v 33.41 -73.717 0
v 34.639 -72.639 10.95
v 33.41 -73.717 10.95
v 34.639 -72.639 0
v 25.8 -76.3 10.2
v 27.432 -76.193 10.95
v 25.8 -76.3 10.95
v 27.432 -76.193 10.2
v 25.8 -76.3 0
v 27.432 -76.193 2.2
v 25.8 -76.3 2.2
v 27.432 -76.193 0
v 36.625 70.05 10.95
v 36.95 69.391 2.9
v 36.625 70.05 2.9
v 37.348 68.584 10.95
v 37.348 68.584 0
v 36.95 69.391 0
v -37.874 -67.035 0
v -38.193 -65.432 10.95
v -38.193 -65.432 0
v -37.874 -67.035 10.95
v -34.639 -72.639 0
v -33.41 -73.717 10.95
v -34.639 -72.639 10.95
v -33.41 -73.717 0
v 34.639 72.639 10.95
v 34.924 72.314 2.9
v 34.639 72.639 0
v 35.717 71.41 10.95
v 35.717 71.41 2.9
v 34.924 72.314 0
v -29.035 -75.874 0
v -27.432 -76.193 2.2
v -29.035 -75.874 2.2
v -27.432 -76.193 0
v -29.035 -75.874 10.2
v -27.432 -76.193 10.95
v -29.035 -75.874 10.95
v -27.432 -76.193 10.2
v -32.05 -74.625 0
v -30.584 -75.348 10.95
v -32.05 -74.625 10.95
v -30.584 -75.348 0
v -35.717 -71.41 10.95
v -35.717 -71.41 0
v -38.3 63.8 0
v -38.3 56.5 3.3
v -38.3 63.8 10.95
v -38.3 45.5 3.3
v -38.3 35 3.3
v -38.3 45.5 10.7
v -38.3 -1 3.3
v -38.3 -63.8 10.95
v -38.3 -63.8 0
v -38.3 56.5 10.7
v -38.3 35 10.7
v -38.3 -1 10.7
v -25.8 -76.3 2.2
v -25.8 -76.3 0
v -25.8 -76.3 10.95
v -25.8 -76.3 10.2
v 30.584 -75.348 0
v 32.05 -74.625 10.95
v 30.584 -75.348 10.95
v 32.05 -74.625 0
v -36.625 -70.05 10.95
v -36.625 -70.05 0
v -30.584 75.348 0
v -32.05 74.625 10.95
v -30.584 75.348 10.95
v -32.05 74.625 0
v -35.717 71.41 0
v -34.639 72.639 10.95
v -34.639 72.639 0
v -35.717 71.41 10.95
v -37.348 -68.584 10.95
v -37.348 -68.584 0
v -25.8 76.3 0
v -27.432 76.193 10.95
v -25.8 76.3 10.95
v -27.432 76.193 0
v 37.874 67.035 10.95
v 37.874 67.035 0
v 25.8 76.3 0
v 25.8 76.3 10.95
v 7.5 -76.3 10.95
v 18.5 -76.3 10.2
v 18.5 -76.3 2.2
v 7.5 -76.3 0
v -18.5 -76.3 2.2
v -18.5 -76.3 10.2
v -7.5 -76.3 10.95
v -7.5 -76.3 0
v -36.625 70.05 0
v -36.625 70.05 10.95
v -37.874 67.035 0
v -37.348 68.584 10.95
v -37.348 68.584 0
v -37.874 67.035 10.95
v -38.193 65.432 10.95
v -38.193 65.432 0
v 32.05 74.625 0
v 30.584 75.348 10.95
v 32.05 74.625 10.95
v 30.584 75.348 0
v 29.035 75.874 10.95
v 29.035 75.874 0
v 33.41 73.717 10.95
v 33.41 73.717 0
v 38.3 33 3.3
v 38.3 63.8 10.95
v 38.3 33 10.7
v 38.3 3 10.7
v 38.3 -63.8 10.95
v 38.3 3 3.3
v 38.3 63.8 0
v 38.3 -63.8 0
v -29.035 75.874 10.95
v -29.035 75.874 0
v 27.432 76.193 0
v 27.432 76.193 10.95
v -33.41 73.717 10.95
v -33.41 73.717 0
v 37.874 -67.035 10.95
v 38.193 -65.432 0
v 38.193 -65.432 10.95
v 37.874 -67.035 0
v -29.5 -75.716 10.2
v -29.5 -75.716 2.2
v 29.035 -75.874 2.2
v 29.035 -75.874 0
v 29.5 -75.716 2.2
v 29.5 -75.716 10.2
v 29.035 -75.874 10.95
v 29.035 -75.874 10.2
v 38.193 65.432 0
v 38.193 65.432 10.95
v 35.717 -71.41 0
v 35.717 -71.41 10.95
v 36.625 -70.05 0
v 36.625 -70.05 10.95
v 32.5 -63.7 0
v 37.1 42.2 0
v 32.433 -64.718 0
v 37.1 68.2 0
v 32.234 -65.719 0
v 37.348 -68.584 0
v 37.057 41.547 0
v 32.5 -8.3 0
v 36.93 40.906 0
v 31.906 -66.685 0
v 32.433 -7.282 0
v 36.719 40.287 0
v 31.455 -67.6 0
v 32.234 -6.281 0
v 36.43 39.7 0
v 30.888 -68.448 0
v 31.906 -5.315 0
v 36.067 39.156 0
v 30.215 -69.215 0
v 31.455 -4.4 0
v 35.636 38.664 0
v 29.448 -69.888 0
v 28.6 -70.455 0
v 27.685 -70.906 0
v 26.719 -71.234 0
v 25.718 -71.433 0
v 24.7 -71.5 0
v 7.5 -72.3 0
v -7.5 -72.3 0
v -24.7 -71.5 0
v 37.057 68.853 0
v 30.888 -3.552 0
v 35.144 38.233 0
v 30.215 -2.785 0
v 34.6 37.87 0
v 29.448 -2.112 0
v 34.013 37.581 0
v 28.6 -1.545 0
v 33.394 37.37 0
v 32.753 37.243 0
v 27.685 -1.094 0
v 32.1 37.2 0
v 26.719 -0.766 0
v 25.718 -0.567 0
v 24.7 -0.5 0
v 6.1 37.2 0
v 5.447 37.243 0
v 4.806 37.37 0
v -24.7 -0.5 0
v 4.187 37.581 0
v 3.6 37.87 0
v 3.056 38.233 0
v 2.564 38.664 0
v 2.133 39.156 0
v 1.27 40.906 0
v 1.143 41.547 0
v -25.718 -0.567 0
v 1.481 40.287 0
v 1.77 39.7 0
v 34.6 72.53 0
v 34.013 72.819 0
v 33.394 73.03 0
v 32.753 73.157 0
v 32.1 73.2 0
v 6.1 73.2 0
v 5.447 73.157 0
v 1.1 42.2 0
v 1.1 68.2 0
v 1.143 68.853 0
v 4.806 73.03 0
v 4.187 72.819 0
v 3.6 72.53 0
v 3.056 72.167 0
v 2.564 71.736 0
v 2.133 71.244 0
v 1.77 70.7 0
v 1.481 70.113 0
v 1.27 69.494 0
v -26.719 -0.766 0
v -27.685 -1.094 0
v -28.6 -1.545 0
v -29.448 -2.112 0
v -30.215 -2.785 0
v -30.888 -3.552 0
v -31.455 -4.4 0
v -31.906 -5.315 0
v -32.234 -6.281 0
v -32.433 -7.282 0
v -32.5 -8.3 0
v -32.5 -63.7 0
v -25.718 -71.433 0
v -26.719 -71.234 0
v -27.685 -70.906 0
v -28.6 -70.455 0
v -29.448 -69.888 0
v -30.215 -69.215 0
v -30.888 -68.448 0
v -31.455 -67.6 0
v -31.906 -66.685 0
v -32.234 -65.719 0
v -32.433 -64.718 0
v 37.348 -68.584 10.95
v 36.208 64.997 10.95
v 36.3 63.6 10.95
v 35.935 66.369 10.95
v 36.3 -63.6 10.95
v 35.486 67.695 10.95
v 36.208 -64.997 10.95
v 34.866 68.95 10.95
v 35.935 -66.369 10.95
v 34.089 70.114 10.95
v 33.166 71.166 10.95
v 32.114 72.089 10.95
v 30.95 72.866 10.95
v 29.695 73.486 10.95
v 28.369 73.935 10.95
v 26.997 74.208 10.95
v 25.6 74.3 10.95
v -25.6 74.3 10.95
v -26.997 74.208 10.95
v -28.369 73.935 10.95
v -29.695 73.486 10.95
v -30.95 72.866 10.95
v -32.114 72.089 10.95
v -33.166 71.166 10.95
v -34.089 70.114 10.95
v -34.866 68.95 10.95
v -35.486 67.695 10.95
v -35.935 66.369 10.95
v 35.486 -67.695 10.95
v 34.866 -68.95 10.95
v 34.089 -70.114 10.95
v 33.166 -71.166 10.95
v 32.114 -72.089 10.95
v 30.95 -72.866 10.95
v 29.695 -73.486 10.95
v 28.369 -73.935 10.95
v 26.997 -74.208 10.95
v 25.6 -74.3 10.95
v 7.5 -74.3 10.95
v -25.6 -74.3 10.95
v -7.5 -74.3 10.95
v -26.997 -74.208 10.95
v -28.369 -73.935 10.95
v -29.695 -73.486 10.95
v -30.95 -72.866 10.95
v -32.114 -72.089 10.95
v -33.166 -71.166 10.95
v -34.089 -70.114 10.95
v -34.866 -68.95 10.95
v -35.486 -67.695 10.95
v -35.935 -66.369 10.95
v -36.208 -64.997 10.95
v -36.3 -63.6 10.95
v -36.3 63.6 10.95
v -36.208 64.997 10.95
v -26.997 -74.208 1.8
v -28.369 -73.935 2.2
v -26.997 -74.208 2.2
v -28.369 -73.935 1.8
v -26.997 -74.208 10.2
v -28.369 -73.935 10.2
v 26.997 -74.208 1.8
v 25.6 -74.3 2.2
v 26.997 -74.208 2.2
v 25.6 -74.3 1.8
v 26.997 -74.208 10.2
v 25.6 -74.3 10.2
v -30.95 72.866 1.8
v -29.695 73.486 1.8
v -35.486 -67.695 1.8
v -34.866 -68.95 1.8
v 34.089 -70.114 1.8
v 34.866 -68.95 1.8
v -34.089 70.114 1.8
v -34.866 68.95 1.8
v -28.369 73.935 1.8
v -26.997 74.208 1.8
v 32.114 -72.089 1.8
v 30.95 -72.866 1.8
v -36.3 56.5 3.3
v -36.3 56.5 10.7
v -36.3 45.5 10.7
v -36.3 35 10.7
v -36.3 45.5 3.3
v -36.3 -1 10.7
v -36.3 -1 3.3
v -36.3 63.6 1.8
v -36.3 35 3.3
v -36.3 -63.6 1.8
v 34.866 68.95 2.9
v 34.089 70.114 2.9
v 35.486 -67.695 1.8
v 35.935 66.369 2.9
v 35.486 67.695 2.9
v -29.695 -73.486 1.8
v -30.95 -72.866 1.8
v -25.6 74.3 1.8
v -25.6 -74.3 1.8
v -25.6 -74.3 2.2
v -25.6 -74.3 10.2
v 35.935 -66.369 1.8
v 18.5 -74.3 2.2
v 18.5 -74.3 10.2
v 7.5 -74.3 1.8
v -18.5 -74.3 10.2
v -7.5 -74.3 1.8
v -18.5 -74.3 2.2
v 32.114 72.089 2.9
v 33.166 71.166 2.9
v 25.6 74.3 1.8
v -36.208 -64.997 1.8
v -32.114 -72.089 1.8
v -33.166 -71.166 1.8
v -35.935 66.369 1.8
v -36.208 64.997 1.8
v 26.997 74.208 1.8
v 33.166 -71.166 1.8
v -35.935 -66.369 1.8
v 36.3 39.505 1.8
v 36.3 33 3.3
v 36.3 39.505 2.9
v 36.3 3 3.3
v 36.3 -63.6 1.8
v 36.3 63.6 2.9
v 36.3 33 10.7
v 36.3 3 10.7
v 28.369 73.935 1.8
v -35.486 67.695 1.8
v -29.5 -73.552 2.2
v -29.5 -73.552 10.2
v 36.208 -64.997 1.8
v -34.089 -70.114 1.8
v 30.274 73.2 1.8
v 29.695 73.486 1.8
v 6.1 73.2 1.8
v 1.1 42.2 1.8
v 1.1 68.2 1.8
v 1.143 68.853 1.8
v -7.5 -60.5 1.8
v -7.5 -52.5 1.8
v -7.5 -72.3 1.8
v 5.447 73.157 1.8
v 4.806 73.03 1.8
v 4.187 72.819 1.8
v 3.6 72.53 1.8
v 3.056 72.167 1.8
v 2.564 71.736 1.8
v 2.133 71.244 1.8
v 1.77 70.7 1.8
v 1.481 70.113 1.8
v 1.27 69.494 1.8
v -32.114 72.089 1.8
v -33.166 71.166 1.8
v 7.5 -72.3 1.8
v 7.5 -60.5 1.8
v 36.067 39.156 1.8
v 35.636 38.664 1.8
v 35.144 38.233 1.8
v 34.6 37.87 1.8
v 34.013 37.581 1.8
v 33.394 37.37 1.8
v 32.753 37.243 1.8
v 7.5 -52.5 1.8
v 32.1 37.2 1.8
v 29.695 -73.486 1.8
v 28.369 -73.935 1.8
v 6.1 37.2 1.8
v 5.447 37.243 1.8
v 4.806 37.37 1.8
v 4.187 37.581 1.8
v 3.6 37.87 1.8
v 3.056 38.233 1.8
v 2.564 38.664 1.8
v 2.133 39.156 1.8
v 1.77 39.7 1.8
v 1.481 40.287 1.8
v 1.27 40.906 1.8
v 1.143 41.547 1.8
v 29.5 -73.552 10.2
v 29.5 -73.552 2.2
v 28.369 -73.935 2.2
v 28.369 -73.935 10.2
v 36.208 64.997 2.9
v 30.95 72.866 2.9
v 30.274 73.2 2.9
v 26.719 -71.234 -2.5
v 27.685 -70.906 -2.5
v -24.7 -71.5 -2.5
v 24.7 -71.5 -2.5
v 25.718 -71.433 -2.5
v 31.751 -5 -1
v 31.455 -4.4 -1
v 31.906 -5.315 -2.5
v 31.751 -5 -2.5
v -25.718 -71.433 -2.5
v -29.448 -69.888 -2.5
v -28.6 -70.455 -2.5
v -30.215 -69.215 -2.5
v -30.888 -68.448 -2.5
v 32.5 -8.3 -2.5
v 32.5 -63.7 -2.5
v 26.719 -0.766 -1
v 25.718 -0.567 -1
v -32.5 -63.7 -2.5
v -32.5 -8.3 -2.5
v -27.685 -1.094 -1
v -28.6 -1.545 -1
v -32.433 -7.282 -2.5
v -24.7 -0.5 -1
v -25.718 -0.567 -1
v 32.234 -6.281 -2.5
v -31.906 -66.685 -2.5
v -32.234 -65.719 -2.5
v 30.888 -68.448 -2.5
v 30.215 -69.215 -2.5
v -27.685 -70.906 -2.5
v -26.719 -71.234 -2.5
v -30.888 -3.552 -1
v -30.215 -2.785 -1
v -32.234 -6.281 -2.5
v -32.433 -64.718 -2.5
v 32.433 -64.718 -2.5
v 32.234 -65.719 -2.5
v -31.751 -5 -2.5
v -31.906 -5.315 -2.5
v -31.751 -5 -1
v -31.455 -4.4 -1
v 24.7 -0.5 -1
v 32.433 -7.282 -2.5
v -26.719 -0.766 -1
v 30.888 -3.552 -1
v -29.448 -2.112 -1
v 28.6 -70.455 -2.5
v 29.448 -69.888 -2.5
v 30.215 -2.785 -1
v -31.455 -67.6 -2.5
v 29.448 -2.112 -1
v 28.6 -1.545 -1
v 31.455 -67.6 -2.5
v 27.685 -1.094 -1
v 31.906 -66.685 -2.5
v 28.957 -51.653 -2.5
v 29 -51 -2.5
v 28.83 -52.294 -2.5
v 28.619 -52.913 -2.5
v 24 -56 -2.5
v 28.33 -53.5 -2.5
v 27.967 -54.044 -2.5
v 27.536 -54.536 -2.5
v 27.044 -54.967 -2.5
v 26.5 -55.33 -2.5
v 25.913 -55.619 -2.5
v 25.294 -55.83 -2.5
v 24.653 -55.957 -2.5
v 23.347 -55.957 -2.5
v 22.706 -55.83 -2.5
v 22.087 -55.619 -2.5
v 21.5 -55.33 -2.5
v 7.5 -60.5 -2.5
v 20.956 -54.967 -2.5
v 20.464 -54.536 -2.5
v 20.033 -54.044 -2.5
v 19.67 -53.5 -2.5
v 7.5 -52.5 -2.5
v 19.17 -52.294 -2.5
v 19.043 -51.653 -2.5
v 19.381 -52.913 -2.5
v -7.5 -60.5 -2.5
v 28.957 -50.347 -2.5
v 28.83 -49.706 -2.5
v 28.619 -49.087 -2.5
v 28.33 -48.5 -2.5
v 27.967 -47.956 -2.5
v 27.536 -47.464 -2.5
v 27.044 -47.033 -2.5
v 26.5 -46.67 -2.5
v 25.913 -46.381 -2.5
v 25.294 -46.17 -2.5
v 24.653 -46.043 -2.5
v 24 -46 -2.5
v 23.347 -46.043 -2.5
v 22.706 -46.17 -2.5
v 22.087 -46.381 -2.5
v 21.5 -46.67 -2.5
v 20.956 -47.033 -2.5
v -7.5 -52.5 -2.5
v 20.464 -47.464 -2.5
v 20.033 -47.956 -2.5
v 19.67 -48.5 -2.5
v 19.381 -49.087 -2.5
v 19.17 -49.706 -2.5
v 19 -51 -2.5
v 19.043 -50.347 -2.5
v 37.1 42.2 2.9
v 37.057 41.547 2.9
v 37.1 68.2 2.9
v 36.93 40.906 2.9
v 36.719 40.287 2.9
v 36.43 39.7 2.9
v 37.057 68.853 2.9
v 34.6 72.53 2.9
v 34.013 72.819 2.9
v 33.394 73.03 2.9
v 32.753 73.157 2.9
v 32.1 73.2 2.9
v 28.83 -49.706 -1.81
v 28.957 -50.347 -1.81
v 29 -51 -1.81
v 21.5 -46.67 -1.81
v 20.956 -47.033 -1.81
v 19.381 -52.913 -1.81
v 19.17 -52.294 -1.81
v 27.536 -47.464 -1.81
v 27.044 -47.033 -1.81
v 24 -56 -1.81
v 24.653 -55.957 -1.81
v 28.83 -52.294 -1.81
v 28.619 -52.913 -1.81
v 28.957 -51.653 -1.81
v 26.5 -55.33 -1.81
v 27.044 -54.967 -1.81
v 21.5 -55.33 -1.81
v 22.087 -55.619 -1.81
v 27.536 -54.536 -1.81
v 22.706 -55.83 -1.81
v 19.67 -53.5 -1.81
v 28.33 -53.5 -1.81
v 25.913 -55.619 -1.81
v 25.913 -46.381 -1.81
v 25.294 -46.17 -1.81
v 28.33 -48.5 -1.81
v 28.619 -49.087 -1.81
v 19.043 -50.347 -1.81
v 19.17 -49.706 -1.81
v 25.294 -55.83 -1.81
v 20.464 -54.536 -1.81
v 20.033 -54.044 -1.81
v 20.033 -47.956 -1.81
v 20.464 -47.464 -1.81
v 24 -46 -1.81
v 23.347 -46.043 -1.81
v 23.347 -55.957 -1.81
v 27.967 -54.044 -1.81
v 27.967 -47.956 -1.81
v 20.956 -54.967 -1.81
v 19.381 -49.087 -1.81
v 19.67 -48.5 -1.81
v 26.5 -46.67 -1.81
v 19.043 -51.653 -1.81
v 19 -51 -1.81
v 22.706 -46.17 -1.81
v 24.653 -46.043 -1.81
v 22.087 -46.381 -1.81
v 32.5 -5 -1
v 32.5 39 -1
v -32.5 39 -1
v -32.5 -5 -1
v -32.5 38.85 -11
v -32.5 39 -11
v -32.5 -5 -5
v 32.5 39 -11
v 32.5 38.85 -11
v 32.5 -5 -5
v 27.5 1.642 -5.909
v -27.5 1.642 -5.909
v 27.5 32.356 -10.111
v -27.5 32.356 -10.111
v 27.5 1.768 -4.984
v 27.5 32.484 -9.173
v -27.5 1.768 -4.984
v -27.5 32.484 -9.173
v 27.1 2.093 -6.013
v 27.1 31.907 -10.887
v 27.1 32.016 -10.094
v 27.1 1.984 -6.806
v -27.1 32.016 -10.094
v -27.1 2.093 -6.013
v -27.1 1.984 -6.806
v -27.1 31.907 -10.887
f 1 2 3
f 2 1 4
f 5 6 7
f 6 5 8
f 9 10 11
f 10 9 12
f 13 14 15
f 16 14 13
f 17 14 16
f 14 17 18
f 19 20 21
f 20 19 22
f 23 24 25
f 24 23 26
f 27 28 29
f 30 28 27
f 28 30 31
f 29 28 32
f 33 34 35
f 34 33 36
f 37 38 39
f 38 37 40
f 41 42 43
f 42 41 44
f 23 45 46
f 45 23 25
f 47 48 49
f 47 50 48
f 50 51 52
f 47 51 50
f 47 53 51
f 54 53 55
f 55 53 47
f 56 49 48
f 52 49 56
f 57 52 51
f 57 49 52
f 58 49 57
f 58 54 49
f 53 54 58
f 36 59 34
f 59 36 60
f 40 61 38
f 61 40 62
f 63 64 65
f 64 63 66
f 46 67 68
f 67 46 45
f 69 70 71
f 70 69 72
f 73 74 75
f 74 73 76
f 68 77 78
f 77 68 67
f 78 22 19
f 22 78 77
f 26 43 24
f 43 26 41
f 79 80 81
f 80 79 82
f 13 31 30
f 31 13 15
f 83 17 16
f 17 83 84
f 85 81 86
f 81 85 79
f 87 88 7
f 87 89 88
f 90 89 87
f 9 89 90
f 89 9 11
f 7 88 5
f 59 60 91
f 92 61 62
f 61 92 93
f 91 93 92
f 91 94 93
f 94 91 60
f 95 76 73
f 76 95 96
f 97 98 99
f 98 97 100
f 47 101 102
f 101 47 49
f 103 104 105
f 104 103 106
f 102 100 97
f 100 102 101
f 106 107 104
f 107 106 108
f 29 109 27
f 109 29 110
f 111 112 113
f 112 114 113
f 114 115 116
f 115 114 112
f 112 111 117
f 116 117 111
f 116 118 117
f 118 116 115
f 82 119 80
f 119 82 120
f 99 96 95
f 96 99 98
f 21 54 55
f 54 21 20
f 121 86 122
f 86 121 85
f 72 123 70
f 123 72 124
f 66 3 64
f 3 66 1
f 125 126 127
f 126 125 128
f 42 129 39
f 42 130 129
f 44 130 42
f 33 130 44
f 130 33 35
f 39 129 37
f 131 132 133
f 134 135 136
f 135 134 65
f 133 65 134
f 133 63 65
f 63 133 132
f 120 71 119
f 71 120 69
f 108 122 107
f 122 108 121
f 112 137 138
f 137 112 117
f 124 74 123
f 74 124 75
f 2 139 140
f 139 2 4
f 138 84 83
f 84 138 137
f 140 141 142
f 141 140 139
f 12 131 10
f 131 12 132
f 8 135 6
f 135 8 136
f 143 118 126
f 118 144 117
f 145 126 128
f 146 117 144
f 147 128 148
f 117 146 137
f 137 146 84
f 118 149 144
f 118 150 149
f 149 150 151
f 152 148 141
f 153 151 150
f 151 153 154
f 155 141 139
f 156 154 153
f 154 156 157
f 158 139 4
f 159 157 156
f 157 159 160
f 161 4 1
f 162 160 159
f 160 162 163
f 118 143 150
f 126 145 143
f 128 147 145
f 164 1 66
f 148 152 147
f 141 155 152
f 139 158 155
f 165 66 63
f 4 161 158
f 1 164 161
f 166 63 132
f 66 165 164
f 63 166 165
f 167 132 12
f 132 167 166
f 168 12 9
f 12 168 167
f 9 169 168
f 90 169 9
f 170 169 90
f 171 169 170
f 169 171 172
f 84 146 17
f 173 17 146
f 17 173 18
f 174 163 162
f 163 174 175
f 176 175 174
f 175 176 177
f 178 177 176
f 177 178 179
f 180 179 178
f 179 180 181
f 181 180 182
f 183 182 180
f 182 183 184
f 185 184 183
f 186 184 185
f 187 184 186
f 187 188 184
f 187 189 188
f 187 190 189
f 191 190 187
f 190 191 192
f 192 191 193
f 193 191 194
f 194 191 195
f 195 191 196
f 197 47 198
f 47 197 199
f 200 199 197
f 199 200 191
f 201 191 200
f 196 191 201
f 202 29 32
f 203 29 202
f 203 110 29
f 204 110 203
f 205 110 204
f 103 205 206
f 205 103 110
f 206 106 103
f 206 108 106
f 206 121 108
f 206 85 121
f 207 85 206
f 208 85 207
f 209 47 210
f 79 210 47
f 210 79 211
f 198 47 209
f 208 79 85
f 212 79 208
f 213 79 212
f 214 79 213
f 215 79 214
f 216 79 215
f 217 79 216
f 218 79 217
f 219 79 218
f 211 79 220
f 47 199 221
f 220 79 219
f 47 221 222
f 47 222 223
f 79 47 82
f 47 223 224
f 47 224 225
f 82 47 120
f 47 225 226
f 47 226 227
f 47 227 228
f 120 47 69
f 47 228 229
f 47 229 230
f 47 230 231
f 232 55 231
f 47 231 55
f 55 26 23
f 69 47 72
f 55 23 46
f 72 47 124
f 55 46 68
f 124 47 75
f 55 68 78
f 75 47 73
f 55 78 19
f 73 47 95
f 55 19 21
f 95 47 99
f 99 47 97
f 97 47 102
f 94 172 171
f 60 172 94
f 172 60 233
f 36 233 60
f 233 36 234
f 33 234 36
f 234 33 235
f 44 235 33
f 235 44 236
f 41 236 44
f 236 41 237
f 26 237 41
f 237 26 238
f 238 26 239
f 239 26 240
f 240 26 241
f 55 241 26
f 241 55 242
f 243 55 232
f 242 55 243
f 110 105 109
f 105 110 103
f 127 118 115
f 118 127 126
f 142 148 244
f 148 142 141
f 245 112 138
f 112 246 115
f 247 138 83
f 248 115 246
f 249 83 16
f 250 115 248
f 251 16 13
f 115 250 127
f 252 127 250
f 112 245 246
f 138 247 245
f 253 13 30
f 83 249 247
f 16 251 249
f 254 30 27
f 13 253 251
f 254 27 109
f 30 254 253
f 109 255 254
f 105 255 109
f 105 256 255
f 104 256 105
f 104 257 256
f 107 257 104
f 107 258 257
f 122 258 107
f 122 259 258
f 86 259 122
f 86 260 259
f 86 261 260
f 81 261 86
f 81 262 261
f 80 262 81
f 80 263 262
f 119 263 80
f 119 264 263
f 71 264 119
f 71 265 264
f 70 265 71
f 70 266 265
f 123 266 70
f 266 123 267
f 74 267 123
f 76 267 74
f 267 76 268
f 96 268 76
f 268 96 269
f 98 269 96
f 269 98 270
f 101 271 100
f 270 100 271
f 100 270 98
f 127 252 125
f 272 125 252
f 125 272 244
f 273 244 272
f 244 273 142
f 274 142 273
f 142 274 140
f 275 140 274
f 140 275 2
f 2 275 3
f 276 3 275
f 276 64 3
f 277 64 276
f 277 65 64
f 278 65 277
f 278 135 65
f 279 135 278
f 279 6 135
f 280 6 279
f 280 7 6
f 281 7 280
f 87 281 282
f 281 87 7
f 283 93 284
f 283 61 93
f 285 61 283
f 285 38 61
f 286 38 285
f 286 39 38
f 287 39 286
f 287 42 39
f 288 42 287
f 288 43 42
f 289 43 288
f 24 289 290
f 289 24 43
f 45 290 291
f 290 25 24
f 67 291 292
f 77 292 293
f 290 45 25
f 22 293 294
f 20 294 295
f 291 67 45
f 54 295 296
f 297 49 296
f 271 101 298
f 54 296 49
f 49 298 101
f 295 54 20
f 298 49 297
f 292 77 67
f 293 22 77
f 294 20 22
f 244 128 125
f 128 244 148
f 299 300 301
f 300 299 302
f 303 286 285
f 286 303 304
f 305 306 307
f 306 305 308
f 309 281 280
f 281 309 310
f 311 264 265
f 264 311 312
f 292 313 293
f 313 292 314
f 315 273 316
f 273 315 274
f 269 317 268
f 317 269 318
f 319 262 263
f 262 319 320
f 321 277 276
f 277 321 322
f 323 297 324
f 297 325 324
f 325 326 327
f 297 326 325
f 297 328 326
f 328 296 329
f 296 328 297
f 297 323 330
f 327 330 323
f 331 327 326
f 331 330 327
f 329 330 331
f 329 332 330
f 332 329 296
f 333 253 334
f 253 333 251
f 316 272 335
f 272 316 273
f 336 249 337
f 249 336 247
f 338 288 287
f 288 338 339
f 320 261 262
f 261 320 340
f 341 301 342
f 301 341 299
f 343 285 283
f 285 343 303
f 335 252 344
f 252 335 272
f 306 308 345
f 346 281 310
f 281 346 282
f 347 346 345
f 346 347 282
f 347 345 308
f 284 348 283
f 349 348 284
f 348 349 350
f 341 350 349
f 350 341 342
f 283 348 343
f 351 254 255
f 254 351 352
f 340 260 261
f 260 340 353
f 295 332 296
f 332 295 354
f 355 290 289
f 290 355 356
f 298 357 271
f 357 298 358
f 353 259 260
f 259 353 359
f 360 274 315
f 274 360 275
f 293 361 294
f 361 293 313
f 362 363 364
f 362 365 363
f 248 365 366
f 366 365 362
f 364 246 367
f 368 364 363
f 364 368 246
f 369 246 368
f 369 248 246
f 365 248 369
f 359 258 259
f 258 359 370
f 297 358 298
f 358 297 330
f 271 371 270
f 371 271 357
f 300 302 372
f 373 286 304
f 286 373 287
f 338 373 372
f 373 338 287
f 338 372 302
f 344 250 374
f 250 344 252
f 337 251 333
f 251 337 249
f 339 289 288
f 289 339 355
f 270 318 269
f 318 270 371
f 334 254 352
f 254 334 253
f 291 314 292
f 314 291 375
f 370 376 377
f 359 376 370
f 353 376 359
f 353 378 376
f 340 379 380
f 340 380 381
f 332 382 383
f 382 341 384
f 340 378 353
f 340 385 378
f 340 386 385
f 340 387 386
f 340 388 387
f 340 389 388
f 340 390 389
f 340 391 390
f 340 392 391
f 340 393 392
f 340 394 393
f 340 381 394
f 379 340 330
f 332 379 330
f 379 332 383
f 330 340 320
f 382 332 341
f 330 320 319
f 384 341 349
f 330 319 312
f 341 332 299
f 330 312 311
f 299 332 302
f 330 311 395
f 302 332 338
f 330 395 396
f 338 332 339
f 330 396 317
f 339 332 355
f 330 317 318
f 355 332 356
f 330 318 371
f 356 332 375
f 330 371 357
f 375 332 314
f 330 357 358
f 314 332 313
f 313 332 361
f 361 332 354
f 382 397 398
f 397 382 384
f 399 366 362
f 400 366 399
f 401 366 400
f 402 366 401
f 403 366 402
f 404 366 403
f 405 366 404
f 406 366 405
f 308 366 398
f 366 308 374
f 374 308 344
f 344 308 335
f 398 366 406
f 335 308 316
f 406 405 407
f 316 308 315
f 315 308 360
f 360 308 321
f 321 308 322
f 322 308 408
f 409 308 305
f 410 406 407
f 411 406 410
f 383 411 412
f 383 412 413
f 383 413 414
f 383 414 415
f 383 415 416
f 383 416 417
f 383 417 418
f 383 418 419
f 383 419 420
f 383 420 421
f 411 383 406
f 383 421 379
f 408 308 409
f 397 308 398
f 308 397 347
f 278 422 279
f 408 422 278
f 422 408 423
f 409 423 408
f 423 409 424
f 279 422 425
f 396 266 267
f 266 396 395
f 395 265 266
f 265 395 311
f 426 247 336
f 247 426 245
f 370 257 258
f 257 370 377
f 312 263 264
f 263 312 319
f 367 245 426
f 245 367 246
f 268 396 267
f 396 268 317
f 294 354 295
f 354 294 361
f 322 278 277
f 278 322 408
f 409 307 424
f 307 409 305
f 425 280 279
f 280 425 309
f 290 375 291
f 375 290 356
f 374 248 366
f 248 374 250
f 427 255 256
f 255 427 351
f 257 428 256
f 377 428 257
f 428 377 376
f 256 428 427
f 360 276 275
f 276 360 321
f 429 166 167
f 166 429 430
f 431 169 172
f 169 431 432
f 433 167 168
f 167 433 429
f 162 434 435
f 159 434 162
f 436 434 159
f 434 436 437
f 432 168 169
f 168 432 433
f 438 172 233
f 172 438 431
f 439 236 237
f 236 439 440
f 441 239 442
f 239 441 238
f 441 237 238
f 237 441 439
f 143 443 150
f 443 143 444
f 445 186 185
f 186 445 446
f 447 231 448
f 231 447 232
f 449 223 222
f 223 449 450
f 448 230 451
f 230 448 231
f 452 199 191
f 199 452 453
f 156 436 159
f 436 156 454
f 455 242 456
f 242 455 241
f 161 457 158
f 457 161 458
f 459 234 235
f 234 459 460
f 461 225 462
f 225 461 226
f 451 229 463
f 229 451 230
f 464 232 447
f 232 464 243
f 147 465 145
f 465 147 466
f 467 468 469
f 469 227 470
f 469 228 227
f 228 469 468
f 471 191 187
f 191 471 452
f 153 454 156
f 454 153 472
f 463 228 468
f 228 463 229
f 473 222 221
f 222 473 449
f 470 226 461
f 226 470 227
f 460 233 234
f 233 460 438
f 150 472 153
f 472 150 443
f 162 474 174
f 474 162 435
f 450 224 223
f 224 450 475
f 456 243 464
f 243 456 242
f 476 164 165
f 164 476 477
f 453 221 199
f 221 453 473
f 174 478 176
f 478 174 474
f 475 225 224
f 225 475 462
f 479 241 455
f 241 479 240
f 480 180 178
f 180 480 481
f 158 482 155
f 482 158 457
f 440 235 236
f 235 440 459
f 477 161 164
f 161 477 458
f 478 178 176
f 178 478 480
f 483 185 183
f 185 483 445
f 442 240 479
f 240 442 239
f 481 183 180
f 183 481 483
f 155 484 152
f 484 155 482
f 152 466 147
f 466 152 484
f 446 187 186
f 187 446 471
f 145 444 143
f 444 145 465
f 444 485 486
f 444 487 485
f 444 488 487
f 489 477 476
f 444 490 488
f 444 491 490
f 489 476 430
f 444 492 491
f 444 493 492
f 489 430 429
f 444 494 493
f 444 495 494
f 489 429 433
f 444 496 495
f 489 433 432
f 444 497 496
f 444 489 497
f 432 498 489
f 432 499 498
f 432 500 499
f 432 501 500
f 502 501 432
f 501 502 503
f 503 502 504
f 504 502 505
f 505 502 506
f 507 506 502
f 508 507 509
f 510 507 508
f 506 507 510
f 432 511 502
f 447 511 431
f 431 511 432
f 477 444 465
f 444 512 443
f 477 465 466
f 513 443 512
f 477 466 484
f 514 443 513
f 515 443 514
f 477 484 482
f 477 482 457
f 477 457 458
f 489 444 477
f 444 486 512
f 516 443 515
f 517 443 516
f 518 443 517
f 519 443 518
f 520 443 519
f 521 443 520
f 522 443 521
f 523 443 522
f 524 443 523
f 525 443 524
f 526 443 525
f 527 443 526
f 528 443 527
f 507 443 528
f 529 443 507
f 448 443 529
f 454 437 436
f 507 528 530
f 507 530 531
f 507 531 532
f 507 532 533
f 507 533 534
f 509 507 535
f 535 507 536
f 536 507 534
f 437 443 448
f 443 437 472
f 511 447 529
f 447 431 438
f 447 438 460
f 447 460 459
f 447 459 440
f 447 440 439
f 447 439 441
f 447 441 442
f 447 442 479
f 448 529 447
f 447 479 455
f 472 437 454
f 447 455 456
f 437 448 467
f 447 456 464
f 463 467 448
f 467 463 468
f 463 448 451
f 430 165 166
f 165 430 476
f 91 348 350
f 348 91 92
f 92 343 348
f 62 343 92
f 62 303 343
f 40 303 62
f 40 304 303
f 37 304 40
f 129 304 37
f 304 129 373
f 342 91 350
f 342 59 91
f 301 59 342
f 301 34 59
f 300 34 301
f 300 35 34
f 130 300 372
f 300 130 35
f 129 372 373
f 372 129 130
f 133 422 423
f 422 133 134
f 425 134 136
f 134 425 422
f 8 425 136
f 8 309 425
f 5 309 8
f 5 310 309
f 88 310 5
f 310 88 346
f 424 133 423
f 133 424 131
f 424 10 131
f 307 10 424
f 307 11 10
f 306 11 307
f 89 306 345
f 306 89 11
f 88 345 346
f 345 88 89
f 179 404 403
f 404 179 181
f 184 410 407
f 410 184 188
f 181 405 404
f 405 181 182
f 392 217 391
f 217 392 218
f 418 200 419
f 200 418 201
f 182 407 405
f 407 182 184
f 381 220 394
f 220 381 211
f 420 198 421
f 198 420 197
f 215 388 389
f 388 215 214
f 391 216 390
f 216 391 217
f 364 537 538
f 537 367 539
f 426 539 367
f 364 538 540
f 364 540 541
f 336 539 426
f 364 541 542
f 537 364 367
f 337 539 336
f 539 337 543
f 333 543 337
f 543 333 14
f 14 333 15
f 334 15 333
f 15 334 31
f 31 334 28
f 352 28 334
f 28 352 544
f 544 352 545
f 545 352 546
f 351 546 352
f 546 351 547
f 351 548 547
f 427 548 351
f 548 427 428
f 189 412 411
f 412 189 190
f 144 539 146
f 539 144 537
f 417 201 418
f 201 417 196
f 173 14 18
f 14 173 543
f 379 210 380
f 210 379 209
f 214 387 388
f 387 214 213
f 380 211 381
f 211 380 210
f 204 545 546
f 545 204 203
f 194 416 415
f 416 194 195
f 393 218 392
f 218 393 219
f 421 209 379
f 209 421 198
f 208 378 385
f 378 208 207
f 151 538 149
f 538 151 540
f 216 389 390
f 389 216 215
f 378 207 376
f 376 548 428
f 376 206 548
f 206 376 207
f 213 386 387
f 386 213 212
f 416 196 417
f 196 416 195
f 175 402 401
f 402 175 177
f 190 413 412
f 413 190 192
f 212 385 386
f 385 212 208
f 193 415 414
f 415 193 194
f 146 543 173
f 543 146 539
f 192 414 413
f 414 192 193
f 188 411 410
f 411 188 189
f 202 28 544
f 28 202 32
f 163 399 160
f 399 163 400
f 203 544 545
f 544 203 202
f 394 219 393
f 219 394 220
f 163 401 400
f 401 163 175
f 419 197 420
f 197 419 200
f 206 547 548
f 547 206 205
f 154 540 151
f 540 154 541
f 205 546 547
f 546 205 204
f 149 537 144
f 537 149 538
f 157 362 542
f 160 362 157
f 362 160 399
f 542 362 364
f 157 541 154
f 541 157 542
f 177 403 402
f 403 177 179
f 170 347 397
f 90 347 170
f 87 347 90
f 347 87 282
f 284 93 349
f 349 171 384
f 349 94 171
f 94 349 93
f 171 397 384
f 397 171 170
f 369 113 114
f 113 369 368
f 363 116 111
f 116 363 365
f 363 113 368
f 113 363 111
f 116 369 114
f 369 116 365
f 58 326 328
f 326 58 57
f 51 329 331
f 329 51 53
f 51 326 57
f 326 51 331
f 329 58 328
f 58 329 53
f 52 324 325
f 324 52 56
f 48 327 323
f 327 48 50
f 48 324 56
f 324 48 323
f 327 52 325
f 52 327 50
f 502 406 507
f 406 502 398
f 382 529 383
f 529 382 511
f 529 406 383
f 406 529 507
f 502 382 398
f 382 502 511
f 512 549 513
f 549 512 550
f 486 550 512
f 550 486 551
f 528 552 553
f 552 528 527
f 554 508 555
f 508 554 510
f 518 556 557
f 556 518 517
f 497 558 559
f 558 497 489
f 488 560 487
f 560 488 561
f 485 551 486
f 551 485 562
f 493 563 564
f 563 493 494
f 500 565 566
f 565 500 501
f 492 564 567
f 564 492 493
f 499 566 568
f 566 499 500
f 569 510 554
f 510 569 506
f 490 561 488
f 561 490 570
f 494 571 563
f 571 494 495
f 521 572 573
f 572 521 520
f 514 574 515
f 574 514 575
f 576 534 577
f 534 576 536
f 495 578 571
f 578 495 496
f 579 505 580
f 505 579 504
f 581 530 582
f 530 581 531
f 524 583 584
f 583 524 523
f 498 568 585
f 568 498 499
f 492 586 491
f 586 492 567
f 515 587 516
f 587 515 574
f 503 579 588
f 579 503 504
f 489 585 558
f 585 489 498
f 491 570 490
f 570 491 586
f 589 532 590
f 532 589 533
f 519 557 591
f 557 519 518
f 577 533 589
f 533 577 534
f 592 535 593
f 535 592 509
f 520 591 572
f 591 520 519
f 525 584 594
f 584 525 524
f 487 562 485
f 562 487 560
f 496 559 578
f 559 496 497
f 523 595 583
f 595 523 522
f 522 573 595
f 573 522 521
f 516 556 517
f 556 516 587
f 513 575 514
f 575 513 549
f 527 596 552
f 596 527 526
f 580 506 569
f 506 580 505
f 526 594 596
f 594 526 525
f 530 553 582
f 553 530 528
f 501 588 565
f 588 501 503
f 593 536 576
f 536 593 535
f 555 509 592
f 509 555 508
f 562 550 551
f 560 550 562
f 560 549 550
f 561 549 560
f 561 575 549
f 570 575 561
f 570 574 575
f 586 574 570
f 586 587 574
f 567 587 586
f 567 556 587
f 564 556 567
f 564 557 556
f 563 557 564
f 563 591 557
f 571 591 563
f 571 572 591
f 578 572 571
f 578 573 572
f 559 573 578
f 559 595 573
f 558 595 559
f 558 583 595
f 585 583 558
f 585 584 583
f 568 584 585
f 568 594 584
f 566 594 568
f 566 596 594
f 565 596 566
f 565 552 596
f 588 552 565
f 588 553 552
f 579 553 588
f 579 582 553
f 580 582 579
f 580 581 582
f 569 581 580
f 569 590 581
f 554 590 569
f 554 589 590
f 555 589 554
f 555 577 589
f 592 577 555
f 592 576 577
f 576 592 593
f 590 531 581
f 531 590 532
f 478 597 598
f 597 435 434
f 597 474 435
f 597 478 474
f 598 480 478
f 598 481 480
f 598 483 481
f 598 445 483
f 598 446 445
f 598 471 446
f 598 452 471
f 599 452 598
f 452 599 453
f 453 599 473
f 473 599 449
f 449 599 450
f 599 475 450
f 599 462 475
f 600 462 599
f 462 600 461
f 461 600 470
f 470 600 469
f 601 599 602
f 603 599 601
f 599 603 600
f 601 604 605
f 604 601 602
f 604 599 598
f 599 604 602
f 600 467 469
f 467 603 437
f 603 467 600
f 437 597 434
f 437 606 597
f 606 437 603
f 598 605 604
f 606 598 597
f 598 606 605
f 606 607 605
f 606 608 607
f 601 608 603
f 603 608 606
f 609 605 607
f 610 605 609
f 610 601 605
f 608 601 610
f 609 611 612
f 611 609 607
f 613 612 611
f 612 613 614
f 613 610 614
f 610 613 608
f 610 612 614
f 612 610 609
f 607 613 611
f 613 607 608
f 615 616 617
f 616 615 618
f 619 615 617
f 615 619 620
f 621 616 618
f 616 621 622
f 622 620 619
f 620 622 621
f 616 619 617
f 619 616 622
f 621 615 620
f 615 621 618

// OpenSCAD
/*
 BASE / iPhone 15 (standard, not Plus or Pro)
 Parametric concept CAD v0.1 — MUST verify dimensions and physical fit.
 Original aesthetic reference: Pamir AI Lapis One; BASE is independent.
 OpenSCAD: choose part and version then render with F6, export STL.
*/
$fn = 48;
part = "assembled"; // assembled | shell | wedge | insert | bezel | fit_coupon
version = "BASE01"; // BASE01 (decorative insert) | BASE02 (LCD pocket)

// Apple-published envelope dimensions. Camera/button values are estimates.
phone_w = 71.6;
phone_h = 147.6;
phone_d = 7.8;
fit = 0.50; // nominal clearance per side; calibrate per printer
wall = 2.00;
back_t = 1.80;
front_lip = 0.85;
inner_w = phone_w + 2*fit;
inner_h = phone_h + 2*fit;
outer_w = inner_w + 2*wall;
outer_h = inner_h + 2*wall;
body_z = back_t + phone_d + 0.5 + front_lip;

// Camera square is provisional. Validate by test fit before daily use.
cam_x = 19.1;
cam_y = 55.2;
cam_w = 36.0;
cam_h = 36.0;

// Rear Lapis-inspired module, oriented beneath camera clearance.
wedge_w = 65.0;
wedge_y0 = -5.0;
wedge_y1 = 39.0;
wedge_z0 = -1.0; // bonding surface; rises outward toward top
wedge_front = -5.0;
wedge_rear = -11.0;
win_y = 17;
win_w = 55.0;
win_h = 31.0;
tilt = -atan((abs(wedge_rear)-abs(wedge_front)) / (wedge_y1-wedge_y0));
win_z = wedge_front + (wedge_rear-wedge_front)*(win_y-wedge_y0)/(wedge_y1-wedge_y0);

module rr2(w,h,r) {
    offset(r=r) square([w-2*r,h-2*r], center=true);
}
module rr3(w,h,t,r) {
    linear_extrude(t) rr2(w,h,r);
}
module wedge_raw() {
    // Hull uses robust native solids (OpenSCAD preview supports their normals).
    hull() {
       translate([-wedge_w/2,wedge_y0,wedge_front])
           cube([wedge_w,0.15,wedge_z0-wedge_front]);
       translate([-wedge_w/2,wedge_y1-0.15,wedge_rear])
           cube([wedge_w,0.15,wedge_z0-wedge_rear]);
    }
}
module sloped_recess(w,h,depth) {
    translate([0,win_y,win_z]) rotate([tilt,0,0])
       translate([0,0,depth/2-0.12]) cube([w,h,depth],center=true);
}
module shell() {
    difference() {
        union() {
            // Open-front protective phone cavity.
            difference() {
                rr3(outer_w,outer_h,body_z,12.5);
                translate([0,0,back_t])
                    rr3(inner_w,inner_h,body_z+1,10.7);
            }
            // Decorative white lower-body raised step, following Lapis One's shape.
            translate([0,-36,-2.5]) rr3(65,71,2.5,7.8);
        }
        // Large rear-camera cutout. The actual bumper must be measured.
        translate([cam_x,cam_y,-3.1]) rr3(cam_w,cam_h,6.0,5.0);
        // Standard iPhone USB-C remains reachable at bottom edge.
        translate([0,-outer_h/2,6.2]) cube([15,8,12.8],center=true);
        // Microphone / speaker clearance below phone (initial approximation).
        for(x=[-24,24]) translate([x,-outer_h/2,6.2])
            cube([11,7,8.0],center=true);
        // Side button reliefs (approximate, designed to avoid pressing buttons).
        translate([outer_w/2,18,7.0]) cube([6,30,7.4],center=true);
        translate([-outer_w/2,17,7.0]) cube([6,36,7.4],center=true);
        translate([-outer_w/2,51,7.0]) cube([6,11,7.4],center=true);
        // Dedicated REAR USB-C opening in decorative lower-body panel.
        // THIS IS AN ACCESS SLOT, not a wired port. A matched extender is TBD.
        translate([0,-56.5,-1.3]) cube([15.0,8.0,8.0],center=true);
        // Small decorative round inset near lower right.
        translate([24,-51,-2.51]) cylinder(h=0.7,d=10);
    }
}
module wedge() {
    difference() {
        wedge_raw();
        if(version=="BASE01")
            sloped_recess(win_w,win_h,1.05);
        else
            // 55 x 31 pocket for 51.2 x 27.3 mm Waveshare LCD module;
            // verify its board thickness, connector, and full fit before use.
            sloped_recess(win_w,win_h,5.45);
    }
}
module insert() { // BASE01: flat, cosmetic black screen insert
    cube([54.2,30.2,0.8],center=true);
}
module bezel() { // BASE02: cover frame; install only after validating actual LCD
    difference() {
        cube([54.2,30.2,1.2],center=true);
        cube([43.4,23.4,2],center=true);
    }
}
module assembled() {
    color([0.93,0.93,0.90]) shell();
    color([1.0,0.47,0.035]) wedge();
    // Position screen insert on the inclined back face.
    color([0.07,0.08,0.09])
    translate([0,win_y,win_z-0.45]) rotate([tilt,0,0])
      if(version=="BASE01") insert(); else bezel();
}
module fit_coupon() { // 24mm section of case bottom: first fit/speaker test
    intersection() {
       shell();
       translate([0,-outer_h/2+12,4]) cube([outer_w+2,24,25],center=true);
    }
}
if(part=="assembled") assembled();
else if(part=="shell") shell();
else if(part=="wedge") wedge();
else if(part=="insert") insert();
else if(part=="bezel") bezel();
else if(part=="fit_coupon") fit_coupon();
